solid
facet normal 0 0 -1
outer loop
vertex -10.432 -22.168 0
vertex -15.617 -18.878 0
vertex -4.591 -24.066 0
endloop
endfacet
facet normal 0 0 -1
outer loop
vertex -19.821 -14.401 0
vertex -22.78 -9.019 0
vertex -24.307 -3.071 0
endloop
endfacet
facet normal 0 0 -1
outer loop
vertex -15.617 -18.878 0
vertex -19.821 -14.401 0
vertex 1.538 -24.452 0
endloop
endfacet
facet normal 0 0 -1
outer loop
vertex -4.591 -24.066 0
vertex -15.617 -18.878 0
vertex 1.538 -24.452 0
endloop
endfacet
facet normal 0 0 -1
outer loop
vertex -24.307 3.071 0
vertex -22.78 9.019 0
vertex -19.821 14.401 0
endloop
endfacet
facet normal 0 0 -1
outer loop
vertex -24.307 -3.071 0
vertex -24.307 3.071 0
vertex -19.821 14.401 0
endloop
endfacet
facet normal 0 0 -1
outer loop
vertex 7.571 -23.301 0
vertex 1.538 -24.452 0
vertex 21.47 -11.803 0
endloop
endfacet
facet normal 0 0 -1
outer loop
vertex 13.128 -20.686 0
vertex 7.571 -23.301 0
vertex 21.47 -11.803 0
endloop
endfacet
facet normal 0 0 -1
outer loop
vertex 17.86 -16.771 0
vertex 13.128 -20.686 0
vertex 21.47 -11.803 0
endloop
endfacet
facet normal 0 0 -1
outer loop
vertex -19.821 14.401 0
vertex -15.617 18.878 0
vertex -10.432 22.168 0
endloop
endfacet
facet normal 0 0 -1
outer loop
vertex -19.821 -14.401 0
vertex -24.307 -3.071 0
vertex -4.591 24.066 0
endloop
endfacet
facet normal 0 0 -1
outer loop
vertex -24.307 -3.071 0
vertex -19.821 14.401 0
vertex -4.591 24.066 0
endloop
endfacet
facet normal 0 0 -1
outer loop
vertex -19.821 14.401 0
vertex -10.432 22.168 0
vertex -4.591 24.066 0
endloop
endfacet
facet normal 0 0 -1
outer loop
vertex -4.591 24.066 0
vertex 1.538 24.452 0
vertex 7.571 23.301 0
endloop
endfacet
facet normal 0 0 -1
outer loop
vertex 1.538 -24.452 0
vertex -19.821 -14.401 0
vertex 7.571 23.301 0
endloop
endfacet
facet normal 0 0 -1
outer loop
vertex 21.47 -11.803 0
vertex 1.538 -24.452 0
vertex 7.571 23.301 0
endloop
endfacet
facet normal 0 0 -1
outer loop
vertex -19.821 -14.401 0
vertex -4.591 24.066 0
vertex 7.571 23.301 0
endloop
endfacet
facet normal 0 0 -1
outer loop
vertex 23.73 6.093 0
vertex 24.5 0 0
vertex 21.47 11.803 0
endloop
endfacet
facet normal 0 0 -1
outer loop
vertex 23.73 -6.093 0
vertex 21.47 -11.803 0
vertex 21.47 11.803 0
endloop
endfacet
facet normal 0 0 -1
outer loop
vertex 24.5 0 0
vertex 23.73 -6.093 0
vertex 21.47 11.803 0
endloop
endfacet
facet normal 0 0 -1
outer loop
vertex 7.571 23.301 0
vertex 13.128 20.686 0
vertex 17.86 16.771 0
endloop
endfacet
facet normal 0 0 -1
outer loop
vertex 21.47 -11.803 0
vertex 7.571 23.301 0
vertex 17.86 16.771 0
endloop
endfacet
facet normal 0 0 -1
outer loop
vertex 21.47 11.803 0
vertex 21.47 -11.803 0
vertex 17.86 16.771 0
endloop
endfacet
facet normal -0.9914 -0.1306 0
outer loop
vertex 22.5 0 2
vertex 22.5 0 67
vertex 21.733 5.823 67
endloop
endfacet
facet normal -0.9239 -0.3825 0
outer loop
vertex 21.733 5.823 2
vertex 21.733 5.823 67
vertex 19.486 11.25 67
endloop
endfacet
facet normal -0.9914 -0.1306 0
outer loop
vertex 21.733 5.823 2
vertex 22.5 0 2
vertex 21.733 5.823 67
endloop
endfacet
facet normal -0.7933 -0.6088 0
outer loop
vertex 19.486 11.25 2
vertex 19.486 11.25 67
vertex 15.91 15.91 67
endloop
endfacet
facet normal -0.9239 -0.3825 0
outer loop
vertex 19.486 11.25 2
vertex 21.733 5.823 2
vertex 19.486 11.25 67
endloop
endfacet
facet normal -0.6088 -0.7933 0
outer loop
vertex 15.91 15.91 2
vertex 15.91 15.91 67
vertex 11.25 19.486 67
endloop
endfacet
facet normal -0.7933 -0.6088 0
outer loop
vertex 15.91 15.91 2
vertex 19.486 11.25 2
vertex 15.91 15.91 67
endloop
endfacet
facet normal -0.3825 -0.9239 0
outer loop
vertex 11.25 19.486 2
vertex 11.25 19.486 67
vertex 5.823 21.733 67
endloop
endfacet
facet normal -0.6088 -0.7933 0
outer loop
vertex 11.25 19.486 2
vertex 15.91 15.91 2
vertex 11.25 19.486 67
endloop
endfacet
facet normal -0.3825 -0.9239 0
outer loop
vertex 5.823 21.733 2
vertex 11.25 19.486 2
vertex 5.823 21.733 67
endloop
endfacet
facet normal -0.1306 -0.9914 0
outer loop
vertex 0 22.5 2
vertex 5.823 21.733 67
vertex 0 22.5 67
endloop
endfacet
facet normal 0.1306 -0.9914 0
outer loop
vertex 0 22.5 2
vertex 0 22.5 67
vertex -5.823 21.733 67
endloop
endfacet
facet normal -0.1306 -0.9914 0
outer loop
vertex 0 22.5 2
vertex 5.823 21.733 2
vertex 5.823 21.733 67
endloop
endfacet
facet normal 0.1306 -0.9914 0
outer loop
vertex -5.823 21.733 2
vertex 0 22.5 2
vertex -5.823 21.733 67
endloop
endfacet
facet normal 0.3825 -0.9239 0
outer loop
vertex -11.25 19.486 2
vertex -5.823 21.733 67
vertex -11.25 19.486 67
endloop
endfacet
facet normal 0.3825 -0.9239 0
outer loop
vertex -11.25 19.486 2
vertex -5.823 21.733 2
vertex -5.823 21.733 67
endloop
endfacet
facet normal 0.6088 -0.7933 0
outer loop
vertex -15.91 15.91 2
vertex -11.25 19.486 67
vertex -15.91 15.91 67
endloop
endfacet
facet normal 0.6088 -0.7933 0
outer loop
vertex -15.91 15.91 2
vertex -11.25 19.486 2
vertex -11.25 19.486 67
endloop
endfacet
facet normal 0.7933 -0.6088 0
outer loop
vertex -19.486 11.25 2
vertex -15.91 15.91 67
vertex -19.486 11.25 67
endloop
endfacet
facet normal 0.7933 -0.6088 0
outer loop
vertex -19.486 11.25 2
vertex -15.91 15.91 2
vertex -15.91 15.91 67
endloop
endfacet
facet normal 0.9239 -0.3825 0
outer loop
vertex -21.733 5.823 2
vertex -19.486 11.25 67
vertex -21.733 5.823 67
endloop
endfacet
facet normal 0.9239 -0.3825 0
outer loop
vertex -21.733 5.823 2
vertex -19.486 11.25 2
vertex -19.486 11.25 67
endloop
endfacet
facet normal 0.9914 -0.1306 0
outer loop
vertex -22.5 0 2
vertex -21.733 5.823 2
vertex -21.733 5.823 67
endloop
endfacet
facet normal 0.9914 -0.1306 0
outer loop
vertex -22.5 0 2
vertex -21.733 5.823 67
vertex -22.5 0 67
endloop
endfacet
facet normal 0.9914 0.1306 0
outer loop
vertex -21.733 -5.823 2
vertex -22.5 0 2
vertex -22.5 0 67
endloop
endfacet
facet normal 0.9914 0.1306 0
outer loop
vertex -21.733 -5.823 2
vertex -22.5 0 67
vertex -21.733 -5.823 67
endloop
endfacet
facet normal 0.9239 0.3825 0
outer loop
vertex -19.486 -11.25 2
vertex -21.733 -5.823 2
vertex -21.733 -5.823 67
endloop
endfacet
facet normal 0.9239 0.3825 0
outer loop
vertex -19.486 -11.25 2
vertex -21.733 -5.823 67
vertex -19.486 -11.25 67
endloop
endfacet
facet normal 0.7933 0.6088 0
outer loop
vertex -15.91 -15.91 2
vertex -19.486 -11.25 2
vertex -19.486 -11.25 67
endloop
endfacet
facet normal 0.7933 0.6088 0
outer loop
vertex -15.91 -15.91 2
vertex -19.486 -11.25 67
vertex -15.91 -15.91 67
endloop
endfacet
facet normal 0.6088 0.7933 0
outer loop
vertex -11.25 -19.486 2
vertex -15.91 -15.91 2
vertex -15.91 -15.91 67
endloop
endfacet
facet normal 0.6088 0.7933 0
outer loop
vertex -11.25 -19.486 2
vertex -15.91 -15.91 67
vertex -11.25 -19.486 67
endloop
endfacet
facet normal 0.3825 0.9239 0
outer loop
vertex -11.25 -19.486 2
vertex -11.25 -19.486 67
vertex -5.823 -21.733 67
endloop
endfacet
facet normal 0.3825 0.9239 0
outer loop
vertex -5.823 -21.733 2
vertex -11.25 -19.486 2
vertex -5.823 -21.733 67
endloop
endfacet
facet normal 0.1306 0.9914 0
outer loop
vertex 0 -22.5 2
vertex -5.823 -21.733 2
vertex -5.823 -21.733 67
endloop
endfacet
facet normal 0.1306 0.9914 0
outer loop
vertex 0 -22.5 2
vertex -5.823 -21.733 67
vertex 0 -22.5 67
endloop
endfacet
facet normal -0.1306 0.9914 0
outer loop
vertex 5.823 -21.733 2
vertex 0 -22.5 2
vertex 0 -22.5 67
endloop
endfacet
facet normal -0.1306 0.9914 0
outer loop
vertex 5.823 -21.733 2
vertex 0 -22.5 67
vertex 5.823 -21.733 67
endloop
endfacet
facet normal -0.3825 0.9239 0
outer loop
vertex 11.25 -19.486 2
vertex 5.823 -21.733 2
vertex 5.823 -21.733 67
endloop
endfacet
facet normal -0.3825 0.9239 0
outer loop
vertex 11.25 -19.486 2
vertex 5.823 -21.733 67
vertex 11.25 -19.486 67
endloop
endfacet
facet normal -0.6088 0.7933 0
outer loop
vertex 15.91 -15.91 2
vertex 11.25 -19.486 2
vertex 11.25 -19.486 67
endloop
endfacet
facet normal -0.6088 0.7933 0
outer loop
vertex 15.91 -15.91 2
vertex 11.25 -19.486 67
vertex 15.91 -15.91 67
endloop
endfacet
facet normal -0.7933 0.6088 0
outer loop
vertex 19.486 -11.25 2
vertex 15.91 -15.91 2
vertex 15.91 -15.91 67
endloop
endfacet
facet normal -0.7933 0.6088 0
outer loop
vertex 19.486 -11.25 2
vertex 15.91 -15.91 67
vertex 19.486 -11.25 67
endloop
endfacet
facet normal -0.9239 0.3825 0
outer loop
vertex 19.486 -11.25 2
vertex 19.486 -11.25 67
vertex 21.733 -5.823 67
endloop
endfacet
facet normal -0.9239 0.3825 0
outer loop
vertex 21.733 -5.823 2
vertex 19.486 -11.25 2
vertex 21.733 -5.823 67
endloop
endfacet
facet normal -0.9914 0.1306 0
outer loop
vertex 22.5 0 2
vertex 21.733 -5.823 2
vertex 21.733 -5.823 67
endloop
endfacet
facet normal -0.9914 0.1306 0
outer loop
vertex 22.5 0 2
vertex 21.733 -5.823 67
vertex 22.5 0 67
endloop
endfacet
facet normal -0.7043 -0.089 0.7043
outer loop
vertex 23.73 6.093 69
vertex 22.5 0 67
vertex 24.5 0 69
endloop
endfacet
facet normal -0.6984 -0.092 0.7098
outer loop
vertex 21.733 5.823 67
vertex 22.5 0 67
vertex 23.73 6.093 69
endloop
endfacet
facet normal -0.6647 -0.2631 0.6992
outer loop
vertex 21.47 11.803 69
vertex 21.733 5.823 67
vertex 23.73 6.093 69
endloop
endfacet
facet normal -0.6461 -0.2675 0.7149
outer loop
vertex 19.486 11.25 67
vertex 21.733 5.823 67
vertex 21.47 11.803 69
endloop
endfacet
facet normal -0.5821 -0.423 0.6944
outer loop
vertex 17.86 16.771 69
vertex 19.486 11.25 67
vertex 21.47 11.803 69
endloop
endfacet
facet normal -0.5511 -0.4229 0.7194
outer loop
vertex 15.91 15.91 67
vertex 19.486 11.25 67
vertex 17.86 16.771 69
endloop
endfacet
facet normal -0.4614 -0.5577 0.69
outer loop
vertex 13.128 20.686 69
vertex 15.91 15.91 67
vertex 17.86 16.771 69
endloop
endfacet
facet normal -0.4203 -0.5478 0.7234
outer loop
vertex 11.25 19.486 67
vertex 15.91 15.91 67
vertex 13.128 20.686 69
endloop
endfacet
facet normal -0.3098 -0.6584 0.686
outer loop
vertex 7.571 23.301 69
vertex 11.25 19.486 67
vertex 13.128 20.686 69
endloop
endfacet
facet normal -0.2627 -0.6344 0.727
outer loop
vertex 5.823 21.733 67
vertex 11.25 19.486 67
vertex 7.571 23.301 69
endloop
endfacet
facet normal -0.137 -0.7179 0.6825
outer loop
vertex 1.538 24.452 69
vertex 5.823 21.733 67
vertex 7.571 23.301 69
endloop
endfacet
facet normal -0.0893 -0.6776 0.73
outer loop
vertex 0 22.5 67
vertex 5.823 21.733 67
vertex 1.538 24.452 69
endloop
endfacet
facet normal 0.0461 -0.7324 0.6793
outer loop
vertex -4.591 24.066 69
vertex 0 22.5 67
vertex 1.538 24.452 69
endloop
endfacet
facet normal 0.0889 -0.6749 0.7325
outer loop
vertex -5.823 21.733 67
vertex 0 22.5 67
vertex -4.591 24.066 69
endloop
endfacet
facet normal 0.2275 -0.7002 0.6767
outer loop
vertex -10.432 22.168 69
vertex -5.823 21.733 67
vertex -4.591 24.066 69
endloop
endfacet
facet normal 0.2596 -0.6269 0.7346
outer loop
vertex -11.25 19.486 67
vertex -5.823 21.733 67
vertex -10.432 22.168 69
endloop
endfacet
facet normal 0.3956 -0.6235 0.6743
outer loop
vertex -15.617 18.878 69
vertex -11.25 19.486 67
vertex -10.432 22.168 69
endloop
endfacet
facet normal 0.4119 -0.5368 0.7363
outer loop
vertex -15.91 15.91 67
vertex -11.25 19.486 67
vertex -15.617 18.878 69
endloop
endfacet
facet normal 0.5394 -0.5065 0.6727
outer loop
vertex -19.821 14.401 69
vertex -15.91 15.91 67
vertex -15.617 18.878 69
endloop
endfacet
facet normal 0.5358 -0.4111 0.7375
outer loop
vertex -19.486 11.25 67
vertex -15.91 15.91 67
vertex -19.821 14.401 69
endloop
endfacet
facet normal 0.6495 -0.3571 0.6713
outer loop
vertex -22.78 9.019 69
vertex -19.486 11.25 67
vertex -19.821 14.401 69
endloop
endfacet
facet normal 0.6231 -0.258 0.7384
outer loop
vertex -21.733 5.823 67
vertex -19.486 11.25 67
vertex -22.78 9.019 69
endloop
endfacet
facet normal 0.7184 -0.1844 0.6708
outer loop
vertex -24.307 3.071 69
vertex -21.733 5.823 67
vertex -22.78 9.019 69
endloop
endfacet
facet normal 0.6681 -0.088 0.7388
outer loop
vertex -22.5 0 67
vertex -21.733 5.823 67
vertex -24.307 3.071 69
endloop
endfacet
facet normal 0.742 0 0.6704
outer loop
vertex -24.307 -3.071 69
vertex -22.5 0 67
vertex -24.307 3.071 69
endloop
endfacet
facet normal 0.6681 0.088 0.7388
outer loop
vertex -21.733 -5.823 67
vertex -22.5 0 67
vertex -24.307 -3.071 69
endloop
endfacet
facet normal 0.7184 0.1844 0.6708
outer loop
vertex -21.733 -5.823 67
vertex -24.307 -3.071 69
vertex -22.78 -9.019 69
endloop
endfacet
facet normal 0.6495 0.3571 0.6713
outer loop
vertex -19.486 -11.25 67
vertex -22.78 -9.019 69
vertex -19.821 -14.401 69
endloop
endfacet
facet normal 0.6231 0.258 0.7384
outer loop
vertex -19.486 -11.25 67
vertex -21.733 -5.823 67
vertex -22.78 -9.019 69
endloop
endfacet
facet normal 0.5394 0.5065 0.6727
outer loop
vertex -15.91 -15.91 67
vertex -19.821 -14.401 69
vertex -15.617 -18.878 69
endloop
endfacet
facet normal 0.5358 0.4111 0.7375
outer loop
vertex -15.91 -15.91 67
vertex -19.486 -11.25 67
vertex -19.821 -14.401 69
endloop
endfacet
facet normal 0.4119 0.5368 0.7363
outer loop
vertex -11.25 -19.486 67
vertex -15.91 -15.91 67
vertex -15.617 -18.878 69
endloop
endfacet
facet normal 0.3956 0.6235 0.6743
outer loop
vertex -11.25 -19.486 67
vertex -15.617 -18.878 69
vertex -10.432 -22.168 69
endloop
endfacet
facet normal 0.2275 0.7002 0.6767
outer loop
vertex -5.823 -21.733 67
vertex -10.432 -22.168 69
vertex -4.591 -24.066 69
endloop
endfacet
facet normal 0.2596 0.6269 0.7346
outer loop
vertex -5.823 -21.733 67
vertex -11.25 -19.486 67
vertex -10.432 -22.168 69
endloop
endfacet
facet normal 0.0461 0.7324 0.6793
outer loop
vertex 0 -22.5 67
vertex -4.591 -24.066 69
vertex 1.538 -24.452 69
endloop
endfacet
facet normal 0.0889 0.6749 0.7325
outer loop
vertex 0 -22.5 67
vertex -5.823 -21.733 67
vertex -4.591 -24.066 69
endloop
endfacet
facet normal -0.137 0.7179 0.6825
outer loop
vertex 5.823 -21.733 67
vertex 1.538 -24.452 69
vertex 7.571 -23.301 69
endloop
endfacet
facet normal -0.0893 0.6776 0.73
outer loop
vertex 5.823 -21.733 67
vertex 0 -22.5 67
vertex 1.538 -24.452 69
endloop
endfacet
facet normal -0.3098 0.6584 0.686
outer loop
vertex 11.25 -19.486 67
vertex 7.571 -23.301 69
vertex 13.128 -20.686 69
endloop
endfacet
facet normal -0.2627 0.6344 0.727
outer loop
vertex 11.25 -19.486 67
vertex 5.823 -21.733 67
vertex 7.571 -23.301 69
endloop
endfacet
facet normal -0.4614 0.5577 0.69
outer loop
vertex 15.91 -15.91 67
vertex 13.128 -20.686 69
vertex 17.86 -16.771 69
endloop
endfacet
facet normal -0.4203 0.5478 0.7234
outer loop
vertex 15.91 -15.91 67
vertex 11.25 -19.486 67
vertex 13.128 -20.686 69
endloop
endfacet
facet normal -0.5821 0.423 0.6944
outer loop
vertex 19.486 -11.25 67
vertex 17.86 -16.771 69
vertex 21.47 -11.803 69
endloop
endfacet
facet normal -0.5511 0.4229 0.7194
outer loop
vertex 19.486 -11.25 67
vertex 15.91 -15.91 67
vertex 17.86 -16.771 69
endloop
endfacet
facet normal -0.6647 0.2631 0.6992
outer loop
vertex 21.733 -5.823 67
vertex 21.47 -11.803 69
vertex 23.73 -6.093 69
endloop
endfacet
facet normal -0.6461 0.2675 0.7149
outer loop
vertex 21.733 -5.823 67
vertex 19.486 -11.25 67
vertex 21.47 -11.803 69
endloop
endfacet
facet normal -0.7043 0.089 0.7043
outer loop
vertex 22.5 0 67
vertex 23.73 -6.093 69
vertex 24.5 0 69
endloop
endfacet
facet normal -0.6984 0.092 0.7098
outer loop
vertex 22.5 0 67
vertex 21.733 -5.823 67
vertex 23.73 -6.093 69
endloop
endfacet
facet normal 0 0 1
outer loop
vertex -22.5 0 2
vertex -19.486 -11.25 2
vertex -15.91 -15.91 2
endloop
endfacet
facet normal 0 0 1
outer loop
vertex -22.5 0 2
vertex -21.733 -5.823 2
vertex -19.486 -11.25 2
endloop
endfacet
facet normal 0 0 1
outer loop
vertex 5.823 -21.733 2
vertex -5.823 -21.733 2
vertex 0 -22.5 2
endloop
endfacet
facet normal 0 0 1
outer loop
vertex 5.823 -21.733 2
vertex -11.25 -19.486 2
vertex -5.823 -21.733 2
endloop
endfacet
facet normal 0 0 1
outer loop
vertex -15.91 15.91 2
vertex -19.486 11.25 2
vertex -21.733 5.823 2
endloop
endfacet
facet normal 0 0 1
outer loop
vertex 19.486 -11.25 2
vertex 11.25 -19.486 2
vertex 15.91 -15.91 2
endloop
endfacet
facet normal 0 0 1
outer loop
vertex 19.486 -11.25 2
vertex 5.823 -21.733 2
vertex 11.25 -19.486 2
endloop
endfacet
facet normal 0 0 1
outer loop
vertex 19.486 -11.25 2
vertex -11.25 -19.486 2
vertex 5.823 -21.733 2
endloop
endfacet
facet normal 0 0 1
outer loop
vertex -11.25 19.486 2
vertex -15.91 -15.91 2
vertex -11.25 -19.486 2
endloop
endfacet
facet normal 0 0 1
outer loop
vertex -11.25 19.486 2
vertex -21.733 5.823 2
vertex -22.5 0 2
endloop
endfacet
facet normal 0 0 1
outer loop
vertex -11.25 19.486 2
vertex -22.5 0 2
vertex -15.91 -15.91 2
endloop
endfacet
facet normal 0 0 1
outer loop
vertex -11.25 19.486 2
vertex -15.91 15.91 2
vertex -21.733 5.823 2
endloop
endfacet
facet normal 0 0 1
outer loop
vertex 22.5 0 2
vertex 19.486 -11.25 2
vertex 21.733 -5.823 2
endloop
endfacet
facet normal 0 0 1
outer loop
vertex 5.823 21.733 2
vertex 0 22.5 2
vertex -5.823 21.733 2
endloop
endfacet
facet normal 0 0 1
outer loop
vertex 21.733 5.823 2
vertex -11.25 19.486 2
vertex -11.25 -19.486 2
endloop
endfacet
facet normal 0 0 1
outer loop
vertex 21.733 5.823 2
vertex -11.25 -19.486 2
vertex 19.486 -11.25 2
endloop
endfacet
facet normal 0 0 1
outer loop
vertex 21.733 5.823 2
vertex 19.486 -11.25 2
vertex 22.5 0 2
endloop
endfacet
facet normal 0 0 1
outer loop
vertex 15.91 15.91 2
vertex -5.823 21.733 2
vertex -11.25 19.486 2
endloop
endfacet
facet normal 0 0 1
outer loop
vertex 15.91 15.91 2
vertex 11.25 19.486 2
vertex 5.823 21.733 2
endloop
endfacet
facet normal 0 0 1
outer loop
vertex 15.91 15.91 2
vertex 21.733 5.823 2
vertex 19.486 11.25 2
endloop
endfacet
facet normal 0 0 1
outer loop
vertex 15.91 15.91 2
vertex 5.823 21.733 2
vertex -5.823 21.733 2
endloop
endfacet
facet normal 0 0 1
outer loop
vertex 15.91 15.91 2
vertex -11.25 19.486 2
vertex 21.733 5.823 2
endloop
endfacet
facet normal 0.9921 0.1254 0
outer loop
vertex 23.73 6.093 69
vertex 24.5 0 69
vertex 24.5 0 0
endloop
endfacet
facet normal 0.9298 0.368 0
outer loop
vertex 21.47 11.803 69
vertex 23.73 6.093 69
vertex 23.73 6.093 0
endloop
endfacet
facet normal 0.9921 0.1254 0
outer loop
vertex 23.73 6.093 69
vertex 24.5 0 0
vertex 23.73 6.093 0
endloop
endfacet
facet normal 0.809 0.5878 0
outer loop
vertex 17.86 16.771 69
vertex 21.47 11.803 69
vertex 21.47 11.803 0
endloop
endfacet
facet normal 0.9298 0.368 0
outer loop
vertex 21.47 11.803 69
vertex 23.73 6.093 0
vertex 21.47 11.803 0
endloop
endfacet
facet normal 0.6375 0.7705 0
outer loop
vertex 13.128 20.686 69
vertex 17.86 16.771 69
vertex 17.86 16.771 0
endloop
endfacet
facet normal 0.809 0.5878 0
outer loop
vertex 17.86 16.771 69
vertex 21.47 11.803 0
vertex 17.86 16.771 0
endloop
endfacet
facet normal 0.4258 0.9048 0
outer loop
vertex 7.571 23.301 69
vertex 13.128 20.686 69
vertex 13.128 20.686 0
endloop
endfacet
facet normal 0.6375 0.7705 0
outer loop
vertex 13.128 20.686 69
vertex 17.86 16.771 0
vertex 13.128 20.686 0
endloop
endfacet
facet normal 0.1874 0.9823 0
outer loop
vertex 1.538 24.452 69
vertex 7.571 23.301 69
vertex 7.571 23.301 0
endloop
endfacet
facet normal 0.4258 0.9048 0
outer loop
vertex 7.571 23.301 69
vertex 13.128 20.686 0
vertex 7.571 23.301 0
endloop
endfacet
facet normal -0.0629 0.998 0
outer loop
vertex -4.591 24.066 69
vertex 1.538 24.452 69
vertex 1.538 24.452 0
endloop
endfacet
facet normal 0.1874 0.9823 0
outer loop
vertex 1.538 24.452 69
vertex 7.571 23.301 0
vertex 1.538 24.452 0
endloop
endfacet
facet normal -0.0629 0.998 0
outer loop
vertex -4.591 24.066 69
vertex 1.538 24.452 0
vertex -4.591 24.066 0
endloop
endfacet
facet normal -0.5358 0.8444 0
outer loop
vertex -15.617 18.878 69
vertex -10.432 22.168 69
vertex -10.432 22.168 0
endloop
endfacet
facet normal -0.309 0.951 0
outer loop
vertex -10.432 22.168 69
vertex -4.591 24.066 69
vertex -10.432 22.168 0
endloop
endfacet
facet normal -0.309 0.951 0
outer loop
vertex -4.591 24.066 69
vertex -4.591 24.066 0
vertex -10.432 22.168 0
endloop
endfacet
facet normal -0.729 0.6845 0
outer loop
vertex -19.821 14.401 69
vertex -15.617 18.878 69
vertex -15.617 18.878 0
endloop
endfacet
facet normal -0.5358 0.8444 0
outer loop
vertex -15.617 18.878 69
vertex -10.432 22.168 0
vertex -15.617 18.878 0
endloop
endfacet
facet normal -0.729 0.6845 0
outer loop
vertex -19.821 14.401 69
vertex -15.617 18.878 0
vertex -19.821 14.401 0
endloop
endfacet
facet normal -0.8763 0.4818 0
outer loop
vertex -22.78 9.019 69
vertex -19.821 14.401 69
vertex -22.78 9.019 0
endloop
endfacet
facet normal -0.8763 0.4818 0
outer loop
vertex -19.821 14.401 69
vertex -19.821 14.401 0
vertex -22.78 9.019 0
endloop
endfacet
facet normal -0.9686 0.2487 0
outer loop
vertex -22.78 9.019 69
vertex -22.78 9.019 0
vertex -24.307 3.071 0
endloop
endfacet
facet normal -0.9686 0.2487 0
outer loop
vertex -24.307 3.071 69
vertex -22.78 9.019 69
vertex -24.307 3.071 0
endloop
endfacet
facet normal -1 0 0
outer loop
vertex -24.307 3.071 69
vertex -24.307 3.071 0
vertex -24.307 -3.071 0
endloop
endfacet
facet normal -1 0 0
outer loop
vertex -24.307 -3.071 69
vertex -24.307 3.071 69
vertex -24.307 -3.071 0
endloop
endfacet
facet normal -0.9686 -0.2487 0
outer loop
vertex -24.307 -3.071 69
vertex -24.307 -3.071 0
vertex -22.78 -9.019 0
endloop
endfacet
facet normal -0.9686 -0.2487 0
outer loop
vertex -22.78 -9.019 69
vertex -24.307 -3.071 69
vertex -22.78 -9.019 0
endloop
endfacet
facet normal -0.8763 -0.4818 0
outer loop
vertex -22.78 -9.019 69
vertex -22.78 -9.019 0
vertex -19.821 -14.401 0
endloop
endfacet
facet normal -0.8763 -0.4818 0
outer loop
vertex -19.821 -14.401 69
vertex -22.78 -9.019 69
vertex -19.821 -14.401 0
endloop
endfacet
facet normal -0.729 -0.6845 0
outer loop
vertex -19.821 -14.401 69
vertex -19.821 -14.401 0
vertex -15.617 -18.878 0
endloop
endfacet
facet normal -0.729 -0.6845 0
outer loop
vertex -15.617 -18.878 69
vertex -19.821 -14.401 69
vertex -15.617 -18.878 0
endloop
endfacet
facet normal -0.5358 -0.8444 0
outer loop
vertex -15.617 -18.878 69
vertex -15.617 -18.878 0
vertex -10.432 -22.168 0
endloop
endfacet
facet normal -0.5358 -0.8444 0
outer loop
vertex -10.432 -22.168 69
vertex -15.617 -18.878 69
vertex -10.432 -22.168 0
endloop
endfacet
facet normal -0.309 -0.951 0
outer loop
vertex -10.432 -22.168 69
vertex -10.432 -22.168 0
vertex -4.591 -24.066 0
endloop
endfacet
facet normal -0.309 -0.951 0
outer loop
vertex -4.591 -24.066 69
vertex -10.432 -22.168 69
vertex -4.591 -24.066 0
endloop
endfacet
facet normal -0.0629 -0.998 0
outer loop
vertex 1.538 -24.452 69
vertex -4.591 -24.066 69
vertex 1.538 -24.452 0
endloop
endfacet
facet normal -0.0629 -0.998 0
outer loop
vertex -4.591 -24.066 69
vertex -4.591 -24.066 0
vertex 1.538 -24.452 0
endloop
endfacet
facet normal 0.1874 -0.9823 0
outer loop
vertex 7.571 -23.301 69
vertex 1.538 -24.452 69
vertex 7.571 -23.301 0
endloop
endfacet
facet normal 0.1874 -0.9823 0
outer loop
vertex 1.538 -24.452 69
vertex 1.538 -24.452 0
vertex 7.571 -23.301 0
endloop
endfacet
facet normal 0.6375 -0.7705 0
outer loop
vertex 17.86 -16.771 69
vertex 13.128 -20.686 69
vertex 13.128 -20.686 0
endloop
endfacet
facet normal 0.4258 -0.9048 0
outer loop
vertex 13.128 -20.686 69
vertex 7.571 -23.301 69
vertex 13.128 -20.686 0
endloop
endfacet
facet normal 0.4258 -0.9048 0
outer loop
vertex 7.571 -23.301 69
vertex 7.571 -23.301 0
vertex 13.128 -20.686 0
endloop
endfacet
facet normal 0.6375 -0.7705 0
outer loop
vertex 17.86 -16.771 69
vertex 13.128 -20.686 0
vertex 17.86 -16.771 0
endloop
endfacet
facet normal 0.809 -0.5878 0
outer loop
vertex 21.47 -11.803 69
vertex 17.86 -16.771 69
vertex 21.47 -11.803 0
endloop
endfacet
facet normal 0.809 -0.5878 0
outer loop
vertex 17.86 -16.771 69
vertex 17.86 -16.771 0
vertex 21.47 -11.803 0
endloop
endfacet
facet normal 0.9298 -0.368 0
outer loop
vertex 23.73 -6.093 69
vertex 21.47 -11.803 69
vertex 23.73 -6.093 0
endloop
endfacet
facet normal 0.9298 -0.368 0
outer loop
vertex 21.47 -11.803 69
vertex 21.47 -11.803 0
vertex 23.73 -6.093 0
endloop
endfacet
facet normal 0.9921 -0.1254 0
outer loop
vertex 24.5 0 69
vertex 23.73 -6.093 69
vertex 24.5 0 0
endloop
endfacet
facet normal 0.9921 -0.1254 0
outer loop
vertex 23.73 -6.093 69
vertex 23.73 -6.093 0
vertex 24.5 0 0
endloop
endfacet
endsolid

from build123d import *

# Parameters (mm, degrees)
F0_R     = 24.5
F1_DEPTH = 72
F2_T     = -2


# Not quite as in the source:
# - a fillet or chamfer that OpenCascade refuses, or shapes differently, is made with other operations: its cross-section is extruded or revolved along the edge and cut away or added


with BuildPart() as f1:
    # F0 (on Top) → F1 (new body)
    with BuildSketch(Plane.XY):
        Circle(F0_R)
    extrude(amount=F1_DEPTH)

    # F2
    f2_openings = [f1.faces().sort_by_distance(p)[0] for p in [
        (0, 0, 72),
    ]]
    offset(amount=F2_T, openings=f2_openings)

    # F3: chamfer of 5 on 1 edges, made by hand

    # F3_s1 → F3_t2 (revolve, cut)
    with BuildSketch(Plane.XZ):
        Polygon((27.5, 72), (22.5, 67), (22.5, 72), align=None)
    revolve(axis=Axis((0, 0, 72), (0, 0, 1)), mode=Mode.SUBTRACT)


solid = f1.part
